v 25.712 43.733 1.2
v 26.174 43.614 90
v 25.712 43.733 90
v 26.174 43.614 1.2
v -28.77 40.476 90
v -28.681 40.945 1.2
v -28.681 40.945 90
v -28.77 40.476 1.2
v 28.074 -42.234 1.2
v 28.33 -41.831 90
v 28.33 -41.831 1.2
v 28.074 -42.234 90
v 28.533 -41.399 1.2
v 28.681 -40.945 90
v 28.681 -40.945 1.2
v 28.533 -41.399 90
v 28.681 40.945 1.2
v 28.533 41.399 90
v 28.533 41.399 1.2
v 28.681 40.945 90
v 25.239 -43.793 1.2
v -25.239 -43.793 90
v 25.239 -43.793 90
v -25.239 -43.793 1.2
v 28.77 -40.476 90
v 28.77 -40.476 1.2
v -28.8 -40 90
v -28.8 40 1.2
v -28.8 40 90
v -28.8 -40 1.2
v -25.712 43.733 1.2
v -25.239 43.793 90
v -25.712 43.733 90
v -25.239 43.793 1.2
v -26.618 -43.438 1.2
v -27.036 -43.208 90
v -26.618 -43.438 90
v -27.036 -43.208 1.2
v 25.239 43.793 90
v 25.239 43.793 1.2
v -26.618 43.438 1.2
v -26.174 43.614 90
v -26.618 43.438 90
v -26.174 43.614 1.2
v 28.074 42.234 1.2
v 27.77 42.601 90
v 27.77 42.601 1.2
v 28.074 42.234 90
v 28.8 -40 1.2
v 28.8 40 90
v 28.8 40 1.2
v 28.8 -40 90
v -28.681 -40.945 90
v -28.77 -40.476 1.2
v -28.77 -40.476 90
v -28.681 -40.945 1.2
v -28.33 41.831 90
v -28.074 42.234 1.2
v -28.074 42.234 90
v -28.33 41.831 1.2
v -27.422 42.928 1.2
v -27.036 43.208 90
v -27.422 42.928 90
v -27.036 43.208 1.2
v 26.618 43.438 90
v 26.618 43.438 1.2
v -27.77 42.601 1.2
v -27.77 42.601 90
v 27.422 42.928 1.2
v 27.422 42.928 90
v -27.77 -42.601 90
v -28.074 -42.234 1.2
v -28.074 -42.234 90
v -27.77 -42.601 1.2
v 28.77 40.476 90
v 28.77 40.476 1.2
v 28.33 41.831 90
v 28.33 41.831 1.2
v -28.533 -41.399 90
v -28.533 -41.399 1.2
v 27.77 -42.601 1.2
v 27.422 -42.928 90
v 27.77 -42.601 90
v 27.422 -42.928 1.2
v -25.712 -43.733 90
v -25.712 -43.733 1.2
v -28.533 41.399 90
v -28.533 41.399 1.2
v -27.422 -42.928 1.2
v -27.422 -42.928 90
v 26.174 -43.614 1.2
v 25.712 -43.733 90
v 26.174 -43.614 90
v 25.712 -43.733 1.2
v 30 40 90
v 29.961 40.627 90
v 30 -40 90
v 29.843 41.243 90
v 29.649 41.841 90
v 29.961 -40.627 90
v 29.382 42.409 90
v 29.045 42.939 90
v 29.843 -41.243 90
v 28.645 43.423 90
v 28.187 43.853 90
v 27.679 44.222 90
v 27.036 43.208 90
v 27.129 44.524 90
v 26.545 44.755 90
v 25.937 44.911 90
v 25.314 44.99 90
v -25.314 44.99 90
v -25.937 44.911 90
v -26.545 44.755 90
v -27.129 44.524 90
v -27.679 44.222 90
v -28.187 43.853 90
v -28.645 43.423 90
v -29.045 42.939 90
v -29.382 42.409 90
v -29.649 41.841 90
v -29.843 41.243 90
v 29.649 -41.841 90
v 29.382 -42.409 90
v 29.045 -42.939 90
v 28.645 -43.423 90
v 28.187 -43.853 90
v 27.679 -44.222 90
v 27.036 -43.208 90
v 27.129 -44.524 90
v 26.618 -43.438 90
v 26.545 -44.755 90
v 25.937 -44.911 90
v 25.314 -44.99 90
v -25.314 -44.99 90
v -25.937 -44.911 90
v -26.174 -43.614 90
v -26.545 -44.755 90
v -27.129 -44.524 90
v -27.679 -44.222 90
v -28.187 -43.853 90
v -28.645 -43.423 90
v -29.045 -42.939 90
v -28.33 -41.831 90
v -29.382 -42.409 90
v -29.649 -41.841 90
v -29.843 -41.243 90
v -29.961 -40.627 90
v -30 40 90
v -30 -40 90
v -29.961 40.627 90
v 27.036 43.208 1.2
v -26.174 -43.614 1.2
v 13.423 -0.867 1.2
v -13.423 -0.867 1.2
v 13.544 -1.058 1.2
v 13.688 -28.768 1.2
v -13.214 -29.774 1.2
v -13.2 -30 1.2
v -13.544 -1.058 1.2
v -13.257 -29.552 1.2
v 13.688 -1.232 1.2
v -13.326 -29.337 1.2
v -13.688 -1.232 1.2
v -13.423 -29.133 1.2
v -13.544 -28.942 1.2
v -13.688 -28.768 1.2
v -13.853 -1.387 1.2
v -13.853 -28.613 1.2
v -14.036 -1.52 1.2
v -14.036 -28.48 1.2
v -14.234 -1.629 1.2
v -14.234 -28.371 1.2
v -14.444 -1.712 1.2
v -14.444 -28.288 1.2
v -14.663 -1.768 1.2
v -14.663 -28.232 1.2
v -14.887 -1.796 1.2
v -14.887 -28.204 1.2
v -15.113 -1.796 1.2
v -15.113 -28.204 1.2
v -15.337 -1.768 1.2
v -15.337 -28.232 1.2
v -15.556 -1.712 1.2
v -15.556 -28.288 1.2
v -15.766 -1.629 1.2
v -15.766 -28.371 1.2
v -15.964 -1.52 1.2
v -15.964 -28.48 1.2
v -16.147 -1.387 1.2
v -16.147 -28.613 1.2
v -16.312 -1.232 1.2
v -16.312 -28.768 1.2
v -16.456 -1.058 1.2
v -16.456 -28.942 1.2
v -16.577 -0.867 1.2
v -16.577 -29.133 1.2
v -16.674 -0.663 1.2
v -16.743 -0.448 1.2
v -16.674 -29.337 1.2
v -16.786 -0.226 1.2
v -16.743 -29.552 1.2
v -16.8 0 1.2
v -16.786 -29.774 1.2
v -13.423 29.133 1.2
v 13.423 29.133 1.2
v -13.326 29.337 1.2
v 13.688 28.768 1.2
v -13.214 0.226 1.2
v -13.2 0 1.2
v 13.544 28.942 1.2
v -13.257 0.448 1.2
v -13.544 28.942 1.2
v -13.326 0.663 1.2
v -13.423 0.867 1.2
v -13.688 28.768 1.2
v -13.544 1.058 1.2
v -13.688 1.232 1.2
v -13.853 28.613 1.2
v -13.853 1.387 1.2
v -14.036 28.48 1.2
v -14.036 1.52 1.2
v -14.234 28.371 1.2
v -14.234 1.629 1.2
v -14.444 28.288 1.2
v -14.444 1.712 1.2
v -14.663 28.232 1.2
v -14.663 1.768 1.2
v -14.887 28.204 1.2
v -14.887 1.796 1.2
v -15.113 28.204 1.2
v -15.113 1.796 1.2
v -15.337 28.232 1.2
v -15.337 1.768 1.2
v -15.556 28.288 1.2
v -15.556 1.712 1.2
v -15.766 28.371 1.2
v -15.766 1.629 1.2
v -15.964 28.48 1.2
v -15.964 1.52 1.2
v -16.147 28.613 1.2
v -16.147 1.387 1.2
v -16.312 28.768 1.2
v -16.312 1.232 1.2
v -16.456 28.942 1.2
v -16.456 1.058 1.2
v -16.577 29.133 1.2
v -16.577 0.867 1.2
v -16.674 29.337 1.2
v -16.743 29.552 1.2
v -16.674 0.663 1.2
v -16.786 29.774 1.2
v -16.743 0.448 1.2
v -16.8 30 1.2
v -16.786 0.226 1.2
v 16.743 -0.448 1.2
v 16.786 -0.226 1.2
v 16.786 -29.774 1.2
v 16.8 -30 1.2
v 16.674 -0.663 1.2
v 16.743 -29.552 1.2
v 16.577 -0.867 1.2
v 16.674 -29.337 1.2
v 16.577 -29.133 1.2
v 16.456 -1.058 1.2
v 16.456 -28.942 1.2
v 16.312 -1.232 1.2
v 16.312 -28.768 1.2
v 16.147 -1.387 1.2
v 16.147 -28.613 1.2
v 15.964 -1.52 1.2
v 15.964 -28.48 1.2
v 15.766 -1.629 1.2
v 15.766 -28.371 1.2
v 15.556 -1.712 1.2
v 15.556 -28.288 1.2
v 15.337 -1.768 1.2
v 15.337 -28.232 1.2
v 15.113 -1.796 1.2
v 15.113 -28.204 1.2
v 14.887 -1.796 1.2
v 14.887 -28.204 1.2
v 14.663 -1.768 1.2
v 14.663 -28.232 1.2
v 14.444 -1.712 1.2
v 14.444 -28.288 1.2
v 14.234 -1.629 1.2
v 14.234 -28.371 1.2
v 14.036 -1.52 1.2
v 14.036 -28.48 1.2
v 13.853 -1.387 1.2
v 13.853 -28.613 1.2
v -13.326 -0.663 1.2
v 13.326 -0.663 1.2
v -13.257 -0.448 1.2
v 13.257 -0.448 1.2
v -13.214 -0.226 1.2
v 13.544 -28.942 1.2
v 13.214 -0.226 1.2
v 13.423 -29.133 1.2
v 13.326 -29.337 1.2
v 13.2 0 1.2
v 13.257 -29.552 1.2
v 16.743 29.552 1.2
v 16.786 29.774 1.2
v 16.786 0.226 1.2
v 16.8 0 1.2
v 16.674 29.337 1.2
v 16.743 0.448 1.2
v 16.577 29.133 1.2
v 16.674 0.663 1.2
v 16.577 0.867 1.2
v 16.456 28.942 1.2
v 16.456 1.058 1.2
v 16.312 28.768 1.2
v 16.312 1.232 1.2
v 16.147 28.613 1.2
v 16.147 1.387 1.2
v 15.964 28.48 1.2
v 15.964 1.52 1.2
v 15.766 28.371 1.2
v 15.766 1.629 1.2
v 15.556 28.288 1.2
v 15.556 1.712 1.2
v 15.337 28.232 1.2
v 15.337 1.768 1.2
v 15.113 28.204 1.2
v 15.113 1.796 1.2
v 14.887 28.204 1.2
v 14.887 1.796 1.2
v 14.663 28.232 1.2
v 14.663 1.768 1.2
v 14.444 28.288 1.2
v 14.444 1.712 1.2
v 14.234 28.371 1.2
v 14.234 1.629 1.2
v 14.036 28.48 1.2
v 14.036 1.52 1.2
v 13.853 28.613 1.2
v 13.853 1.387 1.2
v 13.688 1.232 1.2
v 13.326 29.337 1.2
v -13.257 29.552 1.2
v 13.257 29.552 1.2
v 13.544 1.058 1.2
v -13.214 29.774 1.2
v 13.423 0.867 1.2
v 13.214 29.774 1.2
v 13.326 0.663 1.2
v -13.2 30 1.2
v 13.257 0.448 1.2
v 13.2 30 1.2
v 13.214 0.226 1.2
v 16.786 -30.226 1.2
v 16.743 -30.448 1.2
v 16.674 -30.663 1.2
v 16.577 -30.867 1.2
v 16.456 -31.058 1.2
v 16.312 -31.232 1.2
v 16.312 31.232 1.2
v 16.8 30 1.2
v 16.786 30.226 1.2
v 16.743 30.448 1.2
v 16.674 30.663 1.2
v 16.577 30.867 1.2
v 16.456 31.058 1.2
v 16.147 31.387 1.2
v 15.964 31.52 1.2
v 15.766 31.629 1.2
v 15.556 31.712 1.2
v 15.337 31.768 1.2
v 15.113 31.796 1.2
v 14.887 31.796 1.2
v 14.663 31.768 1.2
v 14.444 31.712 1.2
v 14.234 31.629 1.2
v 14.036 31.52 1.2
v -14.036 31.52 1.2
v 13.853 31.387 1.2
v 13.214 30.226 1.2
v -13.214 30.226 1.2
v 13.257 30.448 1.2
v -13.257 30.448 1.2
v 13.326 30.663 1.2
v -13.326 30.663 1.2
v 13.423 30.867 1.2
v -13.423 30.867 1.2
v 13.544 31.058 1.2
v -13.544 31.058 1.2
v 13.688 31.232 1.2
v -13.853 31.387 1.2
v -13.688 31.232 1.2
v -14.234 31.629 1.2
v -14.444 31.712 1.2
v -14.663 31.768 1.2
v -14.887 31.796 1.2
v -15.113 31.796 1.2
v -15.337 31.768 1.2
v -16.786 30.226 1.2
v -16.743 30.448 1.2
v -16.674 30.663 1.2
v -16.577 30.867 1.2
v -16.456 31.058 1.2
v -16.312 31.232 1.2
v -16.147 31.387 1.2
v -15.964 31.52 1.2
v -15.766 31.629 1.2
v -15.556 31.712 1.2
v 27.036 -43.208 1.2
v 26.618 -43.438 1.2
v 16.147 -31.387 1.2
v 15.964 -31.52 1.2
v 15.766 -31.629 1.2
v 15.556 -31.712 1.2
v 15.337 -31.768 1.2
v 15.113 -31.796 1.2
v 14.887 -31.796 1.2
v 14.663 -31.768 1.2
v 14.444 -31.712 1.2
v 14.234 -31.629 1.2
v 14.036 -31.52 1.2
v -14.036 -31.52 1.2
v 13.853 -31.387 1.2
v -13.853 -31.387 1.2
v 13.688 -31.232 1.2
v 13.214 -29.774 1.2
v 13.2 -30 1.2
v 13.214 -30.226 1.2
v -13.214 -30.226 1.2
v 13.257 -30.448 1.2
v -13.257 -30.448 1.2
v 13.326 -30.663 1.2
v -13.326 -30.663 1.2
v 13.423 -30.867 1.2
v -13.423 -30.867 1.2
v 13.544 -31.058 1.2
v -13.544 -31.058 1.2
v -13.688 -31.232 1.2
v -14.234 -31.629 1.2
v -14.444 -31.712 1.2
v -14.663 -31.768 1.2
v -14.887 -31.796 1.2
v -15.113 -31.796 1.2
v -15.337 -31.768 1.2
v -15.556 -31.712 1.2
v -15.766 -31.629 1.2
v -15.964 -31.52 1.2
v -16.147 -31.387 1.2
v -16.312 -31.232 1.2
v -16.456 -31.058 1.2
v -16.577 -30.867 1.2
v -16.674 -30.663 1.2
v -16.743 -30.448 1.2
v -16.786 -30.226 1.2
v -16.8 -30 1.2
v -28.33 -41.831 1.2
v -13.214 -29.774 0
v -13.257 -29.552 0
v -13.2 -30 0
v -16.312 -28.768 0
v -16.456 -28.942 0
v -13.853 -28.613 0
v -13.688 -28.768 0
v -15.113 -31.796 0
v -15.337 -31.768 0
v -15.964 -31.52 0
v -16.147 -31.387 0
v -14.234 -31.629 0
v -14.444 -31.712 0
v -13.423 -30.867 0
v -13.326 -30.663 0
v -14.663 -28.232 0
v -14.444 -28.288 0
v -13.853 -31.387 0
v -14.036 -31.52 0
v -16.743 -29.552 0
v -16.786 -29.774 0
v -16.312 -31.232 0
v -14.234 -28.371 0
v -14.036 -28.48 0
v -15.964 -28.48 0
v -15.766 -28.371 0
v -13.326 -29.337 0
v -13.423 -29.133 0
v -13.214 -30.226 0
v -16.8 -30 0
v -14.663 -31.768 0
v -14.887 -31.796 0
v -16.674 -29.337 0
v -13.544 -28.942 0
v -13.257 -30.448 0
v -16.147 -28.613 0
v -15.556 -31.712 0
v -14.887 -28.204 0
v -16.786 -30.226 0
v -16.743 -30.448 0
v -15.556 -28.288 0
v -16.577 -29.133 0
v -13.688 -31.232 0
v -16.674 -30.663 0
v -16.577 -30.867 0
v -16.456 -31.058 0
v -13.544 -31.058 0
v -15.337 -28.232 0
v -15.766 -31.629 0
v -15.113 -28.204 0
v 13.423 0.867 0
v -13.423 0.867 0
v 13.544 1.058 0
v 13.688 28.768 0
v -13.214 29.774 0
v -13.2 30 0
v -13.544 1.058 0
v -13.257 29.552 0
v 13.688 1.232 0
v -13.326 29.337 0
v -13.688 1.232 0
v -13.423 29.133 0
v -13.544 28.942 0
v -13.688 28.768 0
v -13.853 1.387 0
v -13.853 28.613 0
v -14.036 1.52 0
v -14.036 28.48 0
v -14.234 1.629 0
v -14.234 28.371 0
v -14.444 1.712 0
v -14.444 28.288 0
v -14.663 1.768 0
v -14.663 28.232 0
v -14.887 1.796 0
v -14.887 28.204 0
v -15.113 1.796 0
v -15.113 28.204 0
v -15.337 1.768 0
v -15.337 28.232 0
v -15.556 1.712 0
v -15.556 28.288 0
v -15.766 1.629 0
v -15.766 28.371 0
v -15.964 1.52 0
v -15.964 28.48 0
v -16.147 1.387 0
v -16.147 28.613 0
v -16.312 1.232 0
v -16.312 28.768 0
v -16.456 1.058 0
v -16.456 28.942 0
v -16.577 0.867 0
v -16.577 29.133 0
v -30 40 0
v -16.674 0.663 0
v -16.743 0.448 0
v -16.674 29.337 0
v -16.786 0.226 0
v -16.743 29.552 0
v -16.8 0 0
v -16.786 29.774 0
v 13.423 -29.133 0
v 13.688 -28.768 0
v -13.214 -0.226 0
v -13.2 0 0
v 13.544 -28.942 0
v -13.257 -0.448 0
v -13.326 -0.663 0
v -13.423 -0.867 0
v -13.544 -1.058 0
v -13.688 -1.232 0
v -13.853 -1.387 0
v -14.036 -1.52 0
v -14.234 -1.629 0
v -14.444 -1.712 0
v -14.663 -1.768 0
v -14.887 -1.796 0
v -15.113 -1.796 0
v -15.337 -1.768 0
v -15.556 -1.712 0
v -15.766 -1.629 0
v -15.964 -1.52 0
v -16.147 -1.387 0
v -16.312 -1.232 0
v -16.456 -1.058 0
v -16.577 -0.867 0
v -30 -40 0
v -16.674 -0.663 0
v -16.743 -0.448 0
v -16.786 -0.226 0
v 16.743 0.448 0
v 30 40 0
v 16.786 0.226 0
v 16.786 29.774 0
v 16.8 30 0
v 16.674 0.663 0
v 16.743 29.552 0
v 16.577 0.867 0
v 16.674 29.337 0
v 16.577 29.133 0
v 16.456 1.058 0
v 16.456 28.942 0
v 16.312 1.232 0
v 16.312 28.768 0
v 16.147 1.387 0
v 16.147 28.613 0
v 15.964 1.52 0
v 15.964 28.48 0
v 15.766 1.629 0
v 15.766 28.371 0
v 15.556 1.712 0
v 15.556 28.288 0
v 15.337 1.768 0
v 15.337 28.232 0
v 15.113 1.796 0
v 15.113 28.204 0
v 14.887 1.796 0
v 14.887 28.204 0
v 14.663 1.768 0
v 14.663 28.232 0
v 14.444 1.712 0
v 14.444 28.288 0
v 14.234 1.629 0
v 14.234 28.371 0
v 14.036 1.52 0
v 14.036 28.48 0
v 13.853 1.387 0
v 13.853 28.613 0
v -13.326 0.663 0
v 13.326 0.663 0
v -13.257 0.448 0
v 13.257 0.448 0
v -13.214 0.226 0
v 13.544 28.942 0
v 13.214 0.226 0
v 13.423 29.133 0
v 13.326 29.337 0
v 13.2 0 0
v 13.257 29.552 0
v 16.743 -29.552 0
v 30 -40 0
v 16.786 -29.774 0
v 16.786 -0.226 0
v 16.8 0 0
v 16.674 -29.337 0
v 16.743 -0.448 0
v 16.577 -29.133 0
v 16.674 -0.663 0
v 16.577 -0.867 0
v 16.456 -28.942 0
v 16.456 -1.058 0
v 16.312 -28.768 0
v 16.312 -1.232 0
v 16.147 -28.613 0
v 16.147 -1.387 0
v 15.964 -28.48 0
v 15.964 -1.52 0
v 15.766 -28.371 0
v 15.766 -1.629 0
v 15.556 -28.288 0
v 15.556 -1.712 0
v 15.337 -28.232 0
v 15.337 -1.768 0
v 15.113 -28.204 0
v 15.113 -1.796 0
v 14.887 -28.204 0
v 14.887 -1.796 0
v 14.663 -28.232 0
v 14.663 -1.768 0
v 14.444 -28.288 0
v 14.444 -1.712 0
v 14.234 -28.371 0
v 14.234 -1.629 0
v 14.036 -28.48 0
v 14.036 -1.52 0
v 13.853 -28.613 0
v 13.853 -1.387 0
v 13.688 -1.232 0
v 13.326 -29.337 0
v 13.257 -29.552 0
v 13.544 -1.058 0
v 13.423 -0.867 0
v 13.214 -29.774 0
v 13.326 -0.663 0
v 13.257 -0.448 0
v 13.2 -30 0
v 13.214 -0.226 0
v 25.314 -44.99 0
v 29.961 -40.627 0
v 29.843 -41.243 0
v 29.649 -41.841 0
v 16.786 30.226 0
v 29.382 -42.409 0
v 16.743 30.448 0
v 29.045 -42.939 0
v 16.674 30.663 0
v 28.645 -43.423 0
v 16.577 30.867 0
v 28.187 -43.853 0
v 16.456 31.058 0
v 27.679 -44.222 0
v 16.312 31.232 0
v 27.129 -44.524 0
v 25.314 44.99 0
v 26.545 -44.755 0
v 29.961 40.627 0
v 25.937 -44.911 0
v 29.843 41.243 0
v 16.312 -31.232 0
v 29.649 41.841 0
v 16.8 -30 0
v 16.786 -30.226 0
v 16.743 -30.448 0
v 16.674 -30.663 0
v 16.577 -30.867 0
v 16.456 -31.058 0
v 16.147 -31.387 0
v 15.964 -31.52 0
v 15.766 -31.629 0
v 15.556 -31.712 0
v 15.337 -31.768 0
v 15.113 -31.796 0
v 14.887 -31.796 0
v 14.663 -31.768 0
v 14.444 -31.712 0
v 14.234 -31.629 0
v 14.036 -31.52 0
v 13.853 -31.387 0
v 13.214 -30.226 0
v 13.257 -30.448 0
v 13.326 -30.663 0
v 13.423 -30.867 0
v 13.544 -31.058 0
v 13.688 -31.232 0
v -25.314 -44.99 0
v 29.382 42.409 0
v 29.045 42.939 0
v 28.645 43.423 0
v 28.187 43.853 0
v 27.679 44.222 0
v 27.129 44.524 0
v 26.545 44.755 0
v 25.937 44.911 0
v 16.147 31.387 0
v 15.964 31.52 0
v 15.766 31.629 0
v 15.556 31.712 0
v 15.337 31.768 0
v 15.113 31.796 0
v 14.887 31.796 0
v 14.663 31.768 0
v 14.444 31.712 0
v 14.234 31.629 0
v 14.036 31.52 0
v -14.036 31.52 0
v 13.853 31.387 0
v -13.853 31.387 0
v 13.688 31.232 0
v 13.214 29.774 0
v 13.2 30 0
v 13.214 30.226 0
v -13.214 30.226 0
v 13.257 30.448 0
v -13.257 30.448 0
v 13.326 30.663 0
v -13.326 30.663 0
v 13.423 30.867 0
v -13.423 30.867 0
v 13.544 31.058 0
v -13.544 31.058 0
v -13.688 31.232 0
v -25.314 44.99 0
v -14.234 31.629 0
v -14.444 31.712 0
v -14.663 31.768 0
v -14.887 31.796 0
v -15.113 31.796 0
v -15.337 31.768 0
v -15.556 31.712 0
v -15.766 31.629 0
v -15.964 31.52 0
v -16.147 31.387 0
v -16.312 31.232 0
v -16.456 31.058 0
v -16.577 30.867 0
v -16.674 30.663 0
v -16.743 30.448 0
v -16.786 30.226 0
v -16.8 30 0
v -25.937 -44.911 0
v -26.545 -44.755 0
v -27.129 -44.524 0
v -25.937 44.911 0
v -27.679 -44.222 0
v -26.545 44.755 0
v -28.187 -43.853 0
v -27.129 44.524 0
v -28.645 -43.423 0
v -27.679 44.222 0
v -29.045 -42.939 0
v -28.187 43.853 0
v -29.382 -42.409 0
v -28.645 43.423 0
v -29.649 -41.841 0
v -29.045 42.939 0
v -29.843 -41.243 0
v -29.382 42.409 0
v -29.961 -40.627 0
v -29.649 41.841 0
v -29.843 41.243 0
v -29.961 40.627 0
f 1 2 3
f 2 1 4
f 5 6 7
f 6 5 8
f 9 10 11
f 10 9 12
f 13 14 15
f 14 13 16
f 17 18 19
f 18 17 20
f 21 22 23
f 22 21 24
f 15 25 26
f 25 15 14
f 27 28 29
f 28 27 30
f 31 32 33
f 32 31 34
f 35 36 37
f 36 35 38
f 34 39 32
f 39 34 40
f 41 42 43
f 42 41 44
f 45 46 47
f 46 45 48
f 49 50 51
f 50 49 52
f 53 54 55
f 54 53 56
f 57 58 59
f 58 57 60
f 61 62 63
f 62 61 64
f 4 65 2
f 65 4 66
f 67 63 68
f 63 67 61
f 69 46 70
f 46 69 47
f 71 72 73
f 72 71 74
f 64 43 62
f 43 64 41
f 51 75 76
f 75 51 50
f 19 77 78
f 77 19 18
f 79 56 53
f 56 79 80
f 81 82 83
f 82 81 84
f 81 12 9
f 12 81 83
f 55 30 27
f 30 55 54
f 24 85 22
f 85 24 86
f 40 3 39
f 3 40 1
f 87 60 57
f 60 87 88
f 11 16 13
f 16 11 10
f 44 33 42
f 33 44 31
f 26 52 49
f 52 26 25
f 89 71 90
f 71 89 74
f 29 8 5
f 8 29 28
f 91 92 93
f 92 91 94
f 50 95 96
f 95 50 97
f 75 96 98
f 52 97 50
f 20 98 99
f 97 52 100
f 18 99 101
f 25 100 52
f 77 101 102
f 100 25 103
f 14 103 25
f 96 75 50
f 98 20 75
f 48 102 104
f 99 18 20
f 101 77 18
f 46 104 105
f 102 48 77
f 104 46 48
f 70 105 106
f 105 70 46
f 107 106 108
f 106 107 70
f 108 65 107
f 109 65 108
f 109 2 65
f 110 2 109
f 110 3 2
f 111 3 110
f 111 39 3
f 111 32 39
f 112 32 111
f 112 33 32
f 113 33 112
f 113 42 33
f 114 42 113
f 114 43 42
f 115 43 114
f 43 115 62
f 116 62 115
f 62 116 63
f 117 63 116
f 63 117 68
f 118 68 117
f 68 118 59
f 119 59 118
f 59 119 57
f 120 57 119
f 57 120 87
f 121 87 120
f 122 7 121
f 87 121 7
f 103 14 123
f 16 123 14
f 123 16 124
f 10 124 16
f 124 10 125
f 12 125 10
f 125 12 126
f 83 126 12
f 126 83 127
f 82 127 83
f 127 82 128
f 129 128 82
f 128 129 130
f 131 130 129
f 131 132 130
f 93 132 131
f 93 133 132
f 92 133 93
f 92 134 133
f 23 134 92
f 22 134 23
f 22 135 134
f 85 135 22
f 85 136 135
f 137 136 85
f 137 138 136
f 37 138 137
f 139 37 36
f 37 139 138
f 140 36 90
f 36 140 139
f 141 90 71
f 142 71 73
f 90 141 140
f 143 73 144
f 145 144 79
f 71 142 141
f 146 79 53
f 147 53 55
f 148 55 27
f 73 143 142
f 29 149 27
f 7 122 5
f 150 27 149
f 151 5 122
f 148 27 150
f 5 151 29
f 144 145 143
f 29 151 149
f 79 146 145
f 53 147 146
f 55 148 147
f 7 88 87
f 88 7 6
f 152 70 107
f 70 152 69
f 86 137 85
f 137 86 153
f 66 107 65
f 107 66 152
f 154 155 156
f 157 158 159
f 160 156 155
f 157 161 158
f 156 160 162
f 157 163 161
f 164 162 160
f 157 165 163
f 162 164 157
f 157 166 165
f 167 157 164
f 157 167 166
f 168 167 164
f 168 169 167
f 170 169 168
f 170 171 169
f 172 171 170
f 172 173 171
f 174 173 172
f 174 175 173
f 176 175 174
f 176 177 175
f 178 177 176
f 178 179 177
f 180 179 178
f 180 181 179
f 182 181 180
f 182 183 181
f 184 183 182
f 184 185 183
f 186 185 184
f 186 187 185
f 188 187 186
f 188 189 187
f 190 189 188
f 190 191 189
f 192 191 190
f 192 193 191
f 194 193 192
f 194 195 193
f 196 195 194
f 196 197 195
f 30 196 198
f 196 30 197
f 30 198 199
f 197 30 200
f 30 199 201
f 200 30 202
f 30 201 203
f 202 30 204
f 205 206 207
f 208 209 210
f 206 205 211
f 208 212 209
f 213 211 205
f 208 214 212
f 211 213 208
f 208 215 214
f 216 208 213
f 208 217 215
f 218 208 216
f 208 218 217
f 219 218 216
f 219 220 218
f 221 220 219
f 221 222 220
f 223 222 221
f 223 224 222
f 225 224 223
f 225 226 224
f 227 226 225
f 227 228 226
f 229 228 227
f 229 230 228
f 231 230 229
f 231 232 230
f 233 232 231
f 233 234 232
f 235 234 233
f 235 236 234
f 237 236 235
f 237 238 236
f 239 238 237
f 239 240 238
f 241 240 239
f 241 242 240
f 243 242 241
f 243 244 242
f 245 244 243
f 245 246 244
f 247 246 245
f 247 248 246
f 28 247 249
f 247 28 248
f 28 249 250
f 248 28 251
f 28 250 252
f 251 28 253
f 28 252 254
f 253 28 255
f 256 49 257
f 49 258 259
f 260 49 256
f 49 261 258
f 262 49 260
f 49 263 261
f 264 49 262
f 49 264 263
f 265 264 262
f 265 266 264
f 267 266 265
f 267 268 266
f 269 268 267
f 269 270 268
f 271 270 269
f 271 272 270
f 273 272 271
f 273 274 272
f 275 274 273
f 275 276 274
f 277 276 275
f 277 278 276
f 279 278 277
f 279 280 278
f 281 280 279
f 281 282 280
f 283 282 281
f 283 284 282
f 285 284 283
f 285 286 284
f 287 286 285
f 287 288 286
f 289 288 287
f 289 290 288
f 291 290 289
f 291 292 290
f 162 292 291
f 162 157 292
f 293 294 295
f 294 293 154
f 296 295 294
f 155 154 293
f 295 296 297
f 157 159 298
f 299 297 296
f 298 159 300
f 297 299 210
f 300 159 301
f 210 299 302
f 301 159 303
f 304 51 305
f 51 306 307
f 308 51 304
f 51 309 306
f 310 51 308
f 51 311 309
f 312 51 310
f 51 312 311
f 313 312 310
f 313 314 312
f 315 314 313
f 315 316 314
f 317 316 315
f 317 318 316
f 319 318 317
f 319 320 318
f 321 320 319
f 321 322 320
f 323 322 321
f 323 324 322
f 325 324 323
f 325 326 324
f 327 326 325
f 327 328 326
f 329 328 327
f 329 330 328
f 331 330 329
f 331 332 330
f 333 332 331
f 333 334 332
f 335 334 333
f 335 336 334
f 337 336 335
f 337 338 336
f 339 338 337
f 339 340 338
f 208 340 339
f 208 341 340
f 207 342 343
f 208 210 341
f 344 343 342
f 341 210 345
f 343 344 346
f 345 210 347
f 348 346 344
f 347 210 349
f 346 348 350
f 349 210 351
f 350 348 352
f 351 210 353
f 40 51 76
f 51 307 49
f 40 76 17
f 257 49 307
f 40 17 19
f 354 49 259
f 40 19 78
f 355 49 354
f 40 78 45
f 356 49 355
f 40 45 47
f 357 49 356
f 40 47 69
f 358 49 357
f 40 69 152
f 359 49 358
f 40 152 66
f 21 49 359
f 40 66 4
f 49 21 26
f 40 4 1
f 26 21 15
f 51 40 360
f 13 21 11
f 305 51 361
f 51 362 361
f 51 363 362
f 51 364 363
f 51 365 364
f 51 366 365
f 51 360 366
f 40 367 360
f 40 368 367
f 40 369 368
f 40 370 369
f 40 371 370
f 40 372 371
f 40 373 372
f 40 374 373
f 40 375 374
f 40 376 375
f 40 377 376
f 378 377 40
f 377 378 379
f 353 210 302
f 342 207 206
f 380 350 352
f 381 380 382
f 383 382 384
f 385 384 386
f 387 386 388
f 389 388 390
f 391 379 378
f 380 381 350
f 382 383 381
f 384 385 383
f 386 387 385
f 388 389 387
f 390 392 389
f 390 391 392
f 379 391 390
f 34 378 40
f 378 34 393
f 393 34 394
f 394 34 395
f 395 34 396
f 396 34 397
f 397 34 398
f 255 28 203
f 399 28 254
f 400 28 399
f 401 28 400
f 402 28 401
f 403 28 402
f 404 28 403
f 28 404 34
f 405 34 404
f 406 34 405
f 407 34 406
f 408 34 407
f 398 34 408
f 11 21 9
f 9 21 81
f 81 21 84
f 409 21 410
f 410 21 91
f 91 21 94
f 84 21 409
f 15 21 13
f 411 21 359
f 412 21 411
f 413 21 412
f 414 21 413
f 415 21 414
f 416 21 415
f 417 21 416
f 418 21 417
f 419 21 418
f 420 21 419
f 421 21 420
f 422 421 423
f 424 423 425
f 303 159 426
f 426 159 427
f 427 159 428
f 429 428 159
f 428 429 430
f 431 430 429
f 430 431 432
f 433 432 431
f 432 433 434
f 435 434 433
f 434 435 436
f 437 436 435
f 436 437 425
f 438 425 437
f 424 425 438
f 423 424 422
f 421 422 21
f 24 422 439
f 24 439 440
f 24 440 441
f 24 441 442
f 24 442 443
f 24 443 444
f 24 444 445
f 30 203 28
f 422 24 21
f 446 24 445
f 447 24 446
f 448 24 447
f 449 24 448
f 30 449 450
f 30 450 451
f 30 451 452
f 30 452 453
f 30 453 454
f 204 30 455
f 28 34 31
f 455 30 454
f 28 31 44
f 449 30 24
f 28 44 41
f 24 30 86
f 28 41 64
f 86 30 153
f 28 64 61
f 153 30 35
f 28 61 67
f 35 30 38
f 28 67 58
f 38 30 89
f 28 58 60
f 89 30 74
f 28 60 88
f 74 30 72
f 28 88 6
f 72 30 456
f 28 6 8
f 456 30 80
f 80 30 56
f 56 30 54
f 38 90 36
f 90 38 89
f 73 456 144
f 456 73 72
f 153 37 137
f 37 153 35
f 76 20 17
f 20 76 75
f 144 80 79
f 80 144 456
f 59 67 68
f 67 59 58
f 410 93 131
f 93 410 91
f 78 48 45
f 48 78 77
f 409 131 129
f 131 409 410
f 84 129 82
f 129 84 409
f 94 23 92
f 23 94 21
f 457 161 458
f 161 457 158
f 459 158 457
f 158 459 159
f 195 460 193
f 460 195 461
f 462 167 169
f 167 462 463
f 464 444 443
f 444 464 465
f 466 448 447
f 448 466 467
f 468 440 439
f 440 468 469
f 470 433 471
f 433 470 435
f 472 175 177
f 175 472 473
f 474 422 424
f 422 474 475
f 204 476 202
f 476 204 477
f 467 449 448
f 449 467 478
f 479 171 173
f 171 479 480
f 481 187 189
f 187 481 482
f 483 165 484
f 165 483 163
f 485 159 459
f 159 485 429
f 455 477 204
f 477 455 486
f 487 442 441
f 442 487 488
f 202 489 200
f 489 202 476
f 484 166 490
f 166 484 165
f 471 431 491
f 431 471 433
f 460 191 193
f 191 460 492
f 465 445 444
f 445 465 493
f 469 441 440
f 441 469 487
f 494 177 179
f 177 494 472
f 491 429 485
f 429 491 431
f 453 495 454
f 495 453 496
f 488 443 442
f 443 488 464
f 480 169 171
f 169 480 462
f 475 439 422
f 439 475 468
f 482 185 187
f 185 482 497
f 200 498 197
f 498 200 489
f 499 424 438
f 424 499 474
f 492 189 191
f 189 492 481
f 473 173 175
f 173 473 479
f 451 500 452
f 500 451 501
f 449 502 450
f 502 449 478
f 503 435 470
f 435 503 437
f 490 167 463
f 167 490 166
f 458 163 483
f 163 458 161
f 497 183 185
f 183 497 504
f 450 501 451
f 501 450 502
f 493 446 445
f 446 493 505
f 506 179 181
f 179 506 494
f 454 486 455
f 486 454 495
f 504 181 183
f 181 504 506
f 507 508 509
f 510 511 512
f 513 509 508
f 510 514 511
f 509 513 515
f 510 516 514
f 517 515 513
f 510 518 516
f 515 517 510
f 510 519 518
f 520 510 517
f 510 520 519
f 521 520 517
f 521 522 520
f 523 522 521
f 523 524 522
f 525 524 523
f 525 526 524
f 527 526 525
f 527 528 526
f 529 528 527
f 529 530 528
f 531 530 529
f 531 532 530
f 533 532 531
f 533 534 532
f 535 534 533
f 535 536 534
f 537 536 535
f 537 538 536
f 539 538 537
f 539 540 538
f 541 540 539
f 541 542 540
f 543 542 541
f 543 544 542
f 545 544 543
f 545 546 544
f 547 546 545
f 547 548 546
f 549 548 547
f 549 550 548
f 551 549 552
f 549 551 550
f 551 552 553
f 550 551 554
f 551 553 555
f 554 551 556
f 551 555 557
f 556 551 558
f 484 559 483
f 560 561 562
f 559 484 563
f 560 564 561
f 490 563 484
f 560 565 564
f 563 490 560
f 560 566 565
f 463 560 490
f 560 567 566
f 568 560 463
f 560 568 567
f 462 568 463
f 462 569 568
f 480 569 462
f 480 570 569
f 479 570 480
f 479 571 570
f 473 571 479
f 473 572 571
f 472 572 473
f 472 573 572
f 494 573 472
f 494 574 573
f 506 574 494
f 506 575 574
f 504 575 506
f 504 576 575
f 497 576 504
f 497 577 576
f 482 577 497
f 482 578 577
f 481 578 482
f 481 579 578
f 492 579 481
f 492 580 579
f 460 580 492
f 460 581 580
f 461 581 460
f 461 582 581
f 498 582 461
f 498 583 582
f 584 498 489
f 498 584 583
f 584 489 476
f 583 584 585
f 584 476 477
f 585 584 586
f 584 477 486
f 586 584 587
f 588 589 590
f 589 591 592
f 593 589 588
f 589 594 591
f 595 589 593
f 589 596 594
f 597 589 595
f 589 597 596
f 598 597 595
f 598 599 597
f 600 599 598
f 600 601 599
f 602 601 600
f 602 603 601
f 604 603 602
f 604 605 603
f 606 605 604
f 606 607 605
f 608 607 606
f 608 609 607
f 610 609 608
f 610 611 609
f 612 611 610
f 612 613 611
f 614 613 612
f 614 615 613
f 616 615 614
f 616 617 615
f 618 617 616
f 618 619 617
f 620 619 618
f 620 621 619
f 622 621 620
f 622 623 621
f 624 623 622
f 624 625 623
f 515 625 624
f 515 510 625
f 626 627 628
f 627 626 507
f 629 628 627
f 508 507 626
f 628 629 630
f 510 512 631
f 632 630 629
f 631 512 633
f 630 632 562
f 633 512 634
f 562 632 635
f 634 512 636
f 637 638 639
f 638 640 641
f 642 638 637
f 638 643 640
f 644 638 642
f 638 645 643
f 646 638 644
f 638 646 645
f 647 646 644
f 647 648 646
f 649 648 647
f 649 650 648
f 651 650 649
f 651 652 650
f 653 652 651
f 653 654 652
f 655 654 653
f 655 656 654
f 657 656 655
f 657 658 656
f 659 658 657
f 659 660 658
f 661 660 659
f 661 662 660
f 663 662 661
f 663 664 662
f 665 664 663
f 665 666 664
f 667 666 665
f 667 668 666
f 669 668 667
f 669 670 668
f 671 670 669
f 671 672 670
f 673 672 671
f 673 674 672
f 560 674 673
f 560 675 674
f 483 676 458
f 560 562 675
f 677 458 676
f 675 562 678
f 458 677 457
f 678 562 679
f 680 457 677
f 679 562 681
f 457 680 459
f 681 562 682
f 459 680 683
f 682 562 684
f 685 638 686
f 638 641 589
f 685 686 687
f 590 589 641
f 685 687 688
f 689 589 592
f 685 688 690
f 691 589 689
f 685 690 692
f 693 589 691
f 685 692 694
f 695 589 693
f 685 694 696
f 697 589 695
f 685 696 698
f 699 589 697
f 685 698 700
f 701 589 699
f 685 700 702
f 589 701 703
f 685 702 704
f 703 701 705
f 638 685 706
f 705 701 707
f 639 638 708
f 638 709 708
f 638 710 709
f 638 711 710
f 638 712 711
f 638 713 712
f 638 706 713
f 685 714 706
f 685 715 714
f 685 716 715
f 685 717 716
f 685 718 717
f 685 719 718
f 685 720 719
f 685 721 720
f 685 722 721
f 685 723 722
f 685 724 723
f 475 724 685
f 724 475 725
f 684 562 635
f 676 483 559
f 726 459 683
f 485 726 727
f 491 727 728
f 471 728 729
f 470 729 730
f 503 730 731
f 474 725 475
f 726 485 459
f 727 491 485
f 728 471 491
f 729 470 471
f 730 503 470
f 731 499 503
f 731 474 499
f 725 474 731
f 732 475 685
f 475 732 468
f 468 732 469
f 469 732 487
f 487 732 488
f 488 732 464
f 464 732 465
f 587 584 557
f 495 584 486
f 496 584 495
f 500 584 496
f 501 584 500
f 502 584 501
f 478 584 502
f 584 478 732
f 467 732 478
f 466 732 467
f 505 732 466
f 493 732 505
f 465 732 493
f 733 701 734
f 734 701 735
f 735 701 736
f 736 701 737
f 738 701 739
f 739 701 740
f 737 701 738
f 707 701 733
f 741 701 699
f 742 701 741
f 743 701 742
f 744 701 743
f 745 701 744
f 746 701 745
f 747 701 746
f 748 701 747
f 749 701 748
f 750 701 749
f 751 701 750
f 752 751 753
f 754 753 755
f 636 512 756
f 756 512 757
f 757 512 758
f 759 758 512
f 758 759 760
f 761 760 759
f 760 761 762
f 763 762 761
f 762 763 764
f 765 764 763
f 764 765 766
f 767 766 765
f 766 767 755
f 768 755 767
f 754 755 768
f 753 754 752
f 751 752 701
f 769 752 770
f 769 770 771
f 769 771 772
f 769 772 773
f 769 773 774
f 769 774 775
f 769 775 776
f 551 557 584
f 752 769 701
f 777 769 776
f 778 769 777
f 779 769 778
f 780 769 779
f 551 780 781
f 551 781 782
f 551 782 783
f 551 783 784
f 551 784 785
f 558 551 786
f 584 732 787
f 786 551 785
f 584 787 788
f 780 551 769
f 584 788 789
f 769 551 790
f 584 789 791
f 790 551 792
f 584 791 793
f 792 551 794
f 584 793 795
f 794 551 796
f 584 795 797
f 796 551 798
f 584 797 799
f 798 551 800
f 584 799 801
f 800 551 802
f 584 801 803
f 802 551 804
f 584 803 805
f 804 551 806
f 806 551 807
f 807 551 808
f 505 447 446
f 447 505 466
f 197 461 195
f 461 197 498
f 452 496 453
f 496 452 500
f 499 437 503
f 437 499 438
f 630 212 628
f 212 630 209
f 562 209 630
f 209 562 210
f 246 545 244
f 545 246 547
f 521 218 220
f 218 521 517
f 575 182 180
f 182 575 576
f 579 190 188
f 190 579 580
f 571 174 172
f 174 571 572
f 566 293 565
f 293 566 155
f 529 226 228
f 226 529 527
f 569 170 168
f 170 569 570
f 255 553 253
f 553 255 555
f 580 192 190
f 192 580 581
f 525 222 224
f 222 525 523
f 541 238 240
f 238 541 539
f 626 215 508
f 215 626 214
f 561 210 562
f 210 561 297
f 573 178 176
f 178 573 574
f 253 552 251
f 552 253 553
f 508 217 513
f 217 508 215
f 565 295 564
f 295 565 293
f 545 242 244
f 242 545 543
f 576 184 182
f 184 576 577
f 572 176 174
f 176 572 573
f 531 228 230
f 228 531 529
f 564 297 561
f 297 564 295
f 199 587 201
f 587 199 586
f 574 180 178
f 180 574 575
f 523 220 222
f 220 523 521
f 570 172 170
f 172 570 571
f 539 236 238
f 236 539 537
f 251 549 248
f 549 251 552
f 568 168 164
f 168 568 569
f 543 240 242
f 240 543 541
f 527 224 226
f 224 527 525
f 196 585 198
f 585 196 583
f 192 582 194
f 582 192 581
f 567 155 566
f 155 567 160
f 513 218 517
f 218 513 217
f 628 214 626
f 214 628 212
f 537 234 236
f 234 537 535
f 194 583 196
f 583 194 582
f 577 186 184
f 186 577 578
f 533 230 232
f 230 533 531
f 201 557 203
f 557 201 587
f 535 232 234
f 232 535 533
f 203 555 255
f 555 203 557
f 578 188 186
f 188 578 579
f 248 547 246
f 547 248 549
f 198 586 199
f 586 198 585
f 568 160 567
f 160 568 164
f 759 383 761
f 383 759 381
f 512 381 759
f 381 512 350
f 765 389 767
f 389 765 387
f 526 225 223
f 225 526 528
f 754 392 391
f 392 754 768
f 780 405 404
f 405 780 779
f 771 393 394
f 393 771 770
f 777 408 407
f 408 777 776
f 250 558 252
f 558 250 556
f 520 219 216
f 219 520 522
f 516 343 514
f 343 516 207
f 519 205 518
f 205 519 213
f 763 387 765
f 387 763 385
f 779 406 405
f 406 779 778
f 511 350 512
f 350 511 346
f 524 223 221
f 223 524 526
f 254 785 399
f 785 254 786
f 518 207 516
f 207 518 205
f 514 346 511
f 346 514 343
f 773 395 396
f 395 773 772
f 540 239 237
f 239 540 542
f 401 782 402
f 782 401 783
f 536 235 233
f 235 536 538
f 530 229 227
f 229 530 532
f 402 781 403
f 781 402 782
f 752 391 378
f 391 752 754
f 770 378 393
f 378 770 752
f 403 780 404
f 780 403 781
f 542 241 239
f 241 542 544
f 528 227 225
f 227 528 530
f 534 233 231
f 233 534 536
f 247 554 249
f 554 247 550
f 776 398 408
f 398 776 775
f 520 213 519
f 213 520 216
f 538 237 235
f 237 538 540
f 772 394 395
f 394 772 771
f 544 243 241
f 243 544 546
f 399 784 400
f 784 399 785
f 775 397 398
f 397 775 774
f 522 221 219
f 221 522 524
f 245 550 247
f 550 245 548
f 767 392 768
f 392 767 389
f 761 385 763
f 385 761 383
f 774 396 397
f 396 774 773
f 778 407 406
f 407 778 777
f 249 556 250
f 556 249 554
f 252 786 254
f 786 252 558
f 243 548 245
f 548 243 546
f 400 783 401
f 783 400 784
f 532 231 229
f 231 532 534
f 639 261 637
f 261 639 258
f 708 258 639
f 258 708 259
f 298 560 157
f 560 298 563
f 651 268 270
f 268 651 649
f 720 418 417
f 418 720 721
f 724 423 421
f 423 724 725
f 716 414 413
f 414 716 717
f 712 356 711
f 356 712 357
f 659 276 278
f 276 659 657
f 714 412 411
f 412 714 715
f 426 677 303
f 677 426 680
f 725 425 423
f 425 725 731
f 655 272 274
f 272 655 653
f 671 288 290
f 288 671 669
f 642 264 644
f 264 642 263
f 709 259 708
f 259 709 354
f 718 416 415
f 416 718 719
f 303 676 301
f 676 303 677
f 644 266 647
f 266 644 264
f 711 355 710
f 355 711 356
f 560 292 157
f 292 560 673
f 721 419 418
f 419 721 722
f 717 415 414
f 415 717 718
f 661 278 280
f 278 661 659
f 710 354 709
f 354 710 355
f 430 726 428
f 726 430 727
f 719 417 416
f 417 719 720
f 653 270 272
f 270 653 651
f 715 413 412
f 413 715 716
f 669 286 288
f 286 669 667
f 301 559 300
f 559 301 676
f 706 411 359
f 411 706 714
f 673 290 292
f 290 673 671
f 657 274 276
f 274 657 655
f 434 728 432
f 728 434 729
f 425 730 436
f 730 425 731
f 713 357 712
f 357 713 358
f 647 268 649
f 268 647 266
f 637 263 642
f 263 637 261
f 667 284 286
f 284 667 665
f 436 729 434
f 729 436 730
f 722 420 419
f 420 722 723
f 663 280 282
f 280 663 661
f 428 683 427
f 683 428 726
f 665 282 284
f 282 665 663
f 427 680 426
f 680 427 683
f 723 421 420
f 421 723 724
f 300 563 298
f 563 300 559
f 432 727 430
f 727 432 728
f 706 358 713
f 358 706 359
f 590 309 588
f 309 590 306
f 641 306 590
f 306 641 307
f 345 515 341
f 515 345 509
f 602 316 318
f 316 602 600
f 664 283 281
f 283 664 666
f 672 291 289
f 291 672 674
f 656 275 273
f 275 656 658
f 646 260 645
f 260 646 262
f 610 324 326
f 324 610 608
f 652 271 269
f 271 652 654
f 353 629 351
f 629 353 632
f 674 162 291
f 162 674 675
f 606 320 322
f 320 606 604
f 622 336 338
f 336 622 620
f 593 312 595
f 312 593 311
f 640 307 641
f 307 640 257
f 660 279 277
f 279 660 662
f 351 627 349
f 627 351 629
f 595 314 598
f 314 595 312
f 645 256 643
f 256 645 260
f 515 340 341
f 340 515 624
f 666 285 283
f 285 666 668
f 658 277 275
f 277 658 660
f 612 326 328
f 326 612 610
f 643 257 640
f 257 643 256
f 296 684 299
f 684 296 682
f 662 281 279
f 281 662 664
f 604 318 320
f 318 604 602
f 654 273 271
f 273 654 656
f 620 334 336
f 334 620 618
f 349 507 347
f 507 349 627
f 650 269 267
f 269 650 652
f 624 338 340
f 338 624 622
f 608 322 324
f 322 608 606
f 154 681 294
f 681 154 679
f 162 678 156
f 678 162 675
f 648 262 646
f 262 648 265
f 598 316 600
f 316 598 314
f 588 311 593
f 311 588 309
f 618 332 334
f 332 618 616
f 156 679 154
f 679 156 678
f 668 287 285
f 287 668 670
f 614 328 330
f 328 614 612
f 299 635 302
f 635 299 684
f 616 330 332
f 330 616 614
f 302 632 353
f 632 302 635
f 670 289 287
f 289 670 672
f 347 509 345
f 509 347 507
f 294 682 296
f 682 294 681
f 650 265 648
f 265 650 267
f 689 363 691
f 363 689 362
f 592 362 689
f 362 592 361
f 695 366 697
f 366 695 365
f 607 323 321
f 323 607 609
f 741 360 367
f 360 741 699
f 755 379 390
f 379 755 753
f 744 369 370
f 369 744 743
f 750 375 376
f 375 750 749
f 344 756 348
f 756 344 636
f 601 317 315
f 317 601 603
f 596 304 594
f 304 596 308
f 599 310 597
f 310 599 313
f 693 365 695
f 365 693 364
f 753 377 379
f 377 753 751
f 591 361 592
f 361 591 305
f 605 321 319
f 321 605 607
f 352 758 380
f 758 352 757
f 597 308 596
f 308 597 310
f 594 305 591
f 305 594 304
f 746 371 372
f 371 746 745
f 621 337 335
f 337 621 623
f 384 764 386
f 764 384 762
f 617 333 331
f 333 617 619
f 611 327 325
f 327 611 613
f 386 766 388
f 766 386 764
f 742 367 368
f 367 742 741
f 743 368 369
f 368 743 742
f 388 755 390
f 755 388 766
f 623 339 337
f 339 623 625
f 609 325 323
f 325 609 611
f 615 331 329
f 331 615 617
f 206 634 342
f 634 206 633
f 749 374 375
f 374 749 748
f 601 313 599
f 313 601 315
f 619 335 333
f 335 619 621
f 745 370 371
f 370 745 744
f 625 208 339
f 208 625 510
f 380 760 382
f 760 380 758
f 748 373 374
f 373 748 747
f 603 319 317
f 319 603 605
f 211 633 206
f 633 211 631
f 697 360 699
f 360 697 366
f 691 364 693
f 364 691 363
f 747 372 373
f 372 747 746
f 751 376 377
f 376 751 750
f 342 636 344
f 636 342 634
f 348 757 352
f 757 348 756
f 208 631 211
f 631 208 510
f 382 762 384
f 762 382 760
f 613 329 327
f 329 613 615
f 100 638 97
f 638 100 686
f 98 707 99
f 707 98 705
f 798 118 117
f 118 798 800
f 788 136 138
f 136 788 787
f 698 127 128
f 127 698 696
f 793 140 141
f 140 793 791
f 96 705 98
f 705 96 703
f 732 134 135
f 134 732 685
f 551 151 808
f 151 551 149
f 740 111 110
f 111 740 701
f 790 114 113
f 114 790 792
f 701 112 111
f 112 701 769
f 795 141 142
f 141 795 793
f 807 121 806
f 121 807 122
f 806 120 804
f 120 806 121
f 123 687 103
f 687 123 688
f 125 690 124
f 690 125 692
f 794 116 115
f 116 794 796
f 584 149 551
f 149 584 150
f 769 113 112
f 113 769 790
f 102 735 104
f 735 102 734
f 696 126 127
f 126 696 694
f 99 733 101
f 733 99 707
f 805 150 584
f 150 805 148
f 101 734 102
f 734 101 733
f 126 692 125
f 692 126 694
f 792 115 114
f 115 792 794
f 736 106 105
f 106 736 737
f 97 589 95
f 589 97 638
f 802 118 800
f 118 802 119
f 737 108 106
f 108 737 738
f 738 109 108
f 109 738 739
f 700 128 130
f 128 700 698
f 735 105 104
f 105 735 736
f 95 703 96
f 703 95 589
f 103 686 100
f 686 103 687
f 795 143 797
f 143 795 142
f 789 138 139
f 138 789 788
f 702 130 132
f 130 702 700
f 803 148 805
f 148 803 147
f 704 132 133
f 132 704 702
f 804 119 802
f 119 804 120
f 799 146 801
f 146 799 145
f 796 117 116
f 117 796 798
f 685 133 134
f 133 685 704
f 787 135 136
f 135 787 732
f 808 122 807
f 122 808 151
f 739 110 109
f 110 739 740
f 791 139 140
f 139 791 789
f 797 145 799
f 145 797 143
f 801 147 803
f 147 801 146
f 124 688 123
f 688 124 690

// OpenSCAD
$fn = 50;


difference() {
	union() {
		hull() {
			translate(v = [-25.0000000000, 40.0000000000, 0]) {
				cylinder(h = 90, r = 5);
			}
			translate(v = [25.0000000000, 40.0000000000, 0]) {
				cylinder(h = 90, r = 5);
			}
			translate(v = [-25.0000000000, -40.0000000000, 0]) {
				cylinder(h = 90, r = 5);
			}
			translate(v = [25.0000000000, -40.0000000000, 0]) {
				cylinder(h = 90, r = 5);
			}
		}
	}
	union() {
		translate(v = [0, 0, 1.2000000000]) {
			hull() {
				translate(v = [-25.0000000000, 40.0000000000, 0]) {
					cylinder(h = 88.8000000000, r = 3.8000000000);
				}
				translate(v = [25.0000000000, 40.0000000000, 0]) {
					cylinder(h = 88.8000000000, r = 3.8000000000);
				}
				translate(v = [-25.0000000000, -40.0000000000, 0]) {
					cylinder(h = 88.8000000000, r = 3.8000000000);
				}
				translate(v = [25.0000000000, -40.0000000000, 0]) {
					cylinder(h = 88.8000000000, r = 3.8000000000);
				}
			}
		}
		#translate(v = [-15.0000000000, -30.0000000000, 0]) {
			cylinder(h = 1.2000000000, r = 1.8000000000);
		}
		#translate(v = [-15.0000000000, 0.0000000000, 0]) {
			cylinder(h = 1.2000000000, r = 1.8000000000);
		}
		#translate(v = [-15.0000000000, 30.0000000000, 0]) {
			cylinder(h = 1.2000000000, r = 1.8000000000);
		}
		#translate(v = [15.0000000000, -30.0000000000, 0]) {
			cylinder(h = 1.2000000000, r = 1.8000000000);
		}
		#translate(v = [15.0000000000, 0.0000000000, 0]) {
			cylinder(h = 1.2000000000, r = 1.8000000000);
		}
		#translate(v = [15.0000000000, 30.0000000000, 0]) {
			cylinder(h = 1.2000000000, r = 1.8000000000);
		}
	}
}
